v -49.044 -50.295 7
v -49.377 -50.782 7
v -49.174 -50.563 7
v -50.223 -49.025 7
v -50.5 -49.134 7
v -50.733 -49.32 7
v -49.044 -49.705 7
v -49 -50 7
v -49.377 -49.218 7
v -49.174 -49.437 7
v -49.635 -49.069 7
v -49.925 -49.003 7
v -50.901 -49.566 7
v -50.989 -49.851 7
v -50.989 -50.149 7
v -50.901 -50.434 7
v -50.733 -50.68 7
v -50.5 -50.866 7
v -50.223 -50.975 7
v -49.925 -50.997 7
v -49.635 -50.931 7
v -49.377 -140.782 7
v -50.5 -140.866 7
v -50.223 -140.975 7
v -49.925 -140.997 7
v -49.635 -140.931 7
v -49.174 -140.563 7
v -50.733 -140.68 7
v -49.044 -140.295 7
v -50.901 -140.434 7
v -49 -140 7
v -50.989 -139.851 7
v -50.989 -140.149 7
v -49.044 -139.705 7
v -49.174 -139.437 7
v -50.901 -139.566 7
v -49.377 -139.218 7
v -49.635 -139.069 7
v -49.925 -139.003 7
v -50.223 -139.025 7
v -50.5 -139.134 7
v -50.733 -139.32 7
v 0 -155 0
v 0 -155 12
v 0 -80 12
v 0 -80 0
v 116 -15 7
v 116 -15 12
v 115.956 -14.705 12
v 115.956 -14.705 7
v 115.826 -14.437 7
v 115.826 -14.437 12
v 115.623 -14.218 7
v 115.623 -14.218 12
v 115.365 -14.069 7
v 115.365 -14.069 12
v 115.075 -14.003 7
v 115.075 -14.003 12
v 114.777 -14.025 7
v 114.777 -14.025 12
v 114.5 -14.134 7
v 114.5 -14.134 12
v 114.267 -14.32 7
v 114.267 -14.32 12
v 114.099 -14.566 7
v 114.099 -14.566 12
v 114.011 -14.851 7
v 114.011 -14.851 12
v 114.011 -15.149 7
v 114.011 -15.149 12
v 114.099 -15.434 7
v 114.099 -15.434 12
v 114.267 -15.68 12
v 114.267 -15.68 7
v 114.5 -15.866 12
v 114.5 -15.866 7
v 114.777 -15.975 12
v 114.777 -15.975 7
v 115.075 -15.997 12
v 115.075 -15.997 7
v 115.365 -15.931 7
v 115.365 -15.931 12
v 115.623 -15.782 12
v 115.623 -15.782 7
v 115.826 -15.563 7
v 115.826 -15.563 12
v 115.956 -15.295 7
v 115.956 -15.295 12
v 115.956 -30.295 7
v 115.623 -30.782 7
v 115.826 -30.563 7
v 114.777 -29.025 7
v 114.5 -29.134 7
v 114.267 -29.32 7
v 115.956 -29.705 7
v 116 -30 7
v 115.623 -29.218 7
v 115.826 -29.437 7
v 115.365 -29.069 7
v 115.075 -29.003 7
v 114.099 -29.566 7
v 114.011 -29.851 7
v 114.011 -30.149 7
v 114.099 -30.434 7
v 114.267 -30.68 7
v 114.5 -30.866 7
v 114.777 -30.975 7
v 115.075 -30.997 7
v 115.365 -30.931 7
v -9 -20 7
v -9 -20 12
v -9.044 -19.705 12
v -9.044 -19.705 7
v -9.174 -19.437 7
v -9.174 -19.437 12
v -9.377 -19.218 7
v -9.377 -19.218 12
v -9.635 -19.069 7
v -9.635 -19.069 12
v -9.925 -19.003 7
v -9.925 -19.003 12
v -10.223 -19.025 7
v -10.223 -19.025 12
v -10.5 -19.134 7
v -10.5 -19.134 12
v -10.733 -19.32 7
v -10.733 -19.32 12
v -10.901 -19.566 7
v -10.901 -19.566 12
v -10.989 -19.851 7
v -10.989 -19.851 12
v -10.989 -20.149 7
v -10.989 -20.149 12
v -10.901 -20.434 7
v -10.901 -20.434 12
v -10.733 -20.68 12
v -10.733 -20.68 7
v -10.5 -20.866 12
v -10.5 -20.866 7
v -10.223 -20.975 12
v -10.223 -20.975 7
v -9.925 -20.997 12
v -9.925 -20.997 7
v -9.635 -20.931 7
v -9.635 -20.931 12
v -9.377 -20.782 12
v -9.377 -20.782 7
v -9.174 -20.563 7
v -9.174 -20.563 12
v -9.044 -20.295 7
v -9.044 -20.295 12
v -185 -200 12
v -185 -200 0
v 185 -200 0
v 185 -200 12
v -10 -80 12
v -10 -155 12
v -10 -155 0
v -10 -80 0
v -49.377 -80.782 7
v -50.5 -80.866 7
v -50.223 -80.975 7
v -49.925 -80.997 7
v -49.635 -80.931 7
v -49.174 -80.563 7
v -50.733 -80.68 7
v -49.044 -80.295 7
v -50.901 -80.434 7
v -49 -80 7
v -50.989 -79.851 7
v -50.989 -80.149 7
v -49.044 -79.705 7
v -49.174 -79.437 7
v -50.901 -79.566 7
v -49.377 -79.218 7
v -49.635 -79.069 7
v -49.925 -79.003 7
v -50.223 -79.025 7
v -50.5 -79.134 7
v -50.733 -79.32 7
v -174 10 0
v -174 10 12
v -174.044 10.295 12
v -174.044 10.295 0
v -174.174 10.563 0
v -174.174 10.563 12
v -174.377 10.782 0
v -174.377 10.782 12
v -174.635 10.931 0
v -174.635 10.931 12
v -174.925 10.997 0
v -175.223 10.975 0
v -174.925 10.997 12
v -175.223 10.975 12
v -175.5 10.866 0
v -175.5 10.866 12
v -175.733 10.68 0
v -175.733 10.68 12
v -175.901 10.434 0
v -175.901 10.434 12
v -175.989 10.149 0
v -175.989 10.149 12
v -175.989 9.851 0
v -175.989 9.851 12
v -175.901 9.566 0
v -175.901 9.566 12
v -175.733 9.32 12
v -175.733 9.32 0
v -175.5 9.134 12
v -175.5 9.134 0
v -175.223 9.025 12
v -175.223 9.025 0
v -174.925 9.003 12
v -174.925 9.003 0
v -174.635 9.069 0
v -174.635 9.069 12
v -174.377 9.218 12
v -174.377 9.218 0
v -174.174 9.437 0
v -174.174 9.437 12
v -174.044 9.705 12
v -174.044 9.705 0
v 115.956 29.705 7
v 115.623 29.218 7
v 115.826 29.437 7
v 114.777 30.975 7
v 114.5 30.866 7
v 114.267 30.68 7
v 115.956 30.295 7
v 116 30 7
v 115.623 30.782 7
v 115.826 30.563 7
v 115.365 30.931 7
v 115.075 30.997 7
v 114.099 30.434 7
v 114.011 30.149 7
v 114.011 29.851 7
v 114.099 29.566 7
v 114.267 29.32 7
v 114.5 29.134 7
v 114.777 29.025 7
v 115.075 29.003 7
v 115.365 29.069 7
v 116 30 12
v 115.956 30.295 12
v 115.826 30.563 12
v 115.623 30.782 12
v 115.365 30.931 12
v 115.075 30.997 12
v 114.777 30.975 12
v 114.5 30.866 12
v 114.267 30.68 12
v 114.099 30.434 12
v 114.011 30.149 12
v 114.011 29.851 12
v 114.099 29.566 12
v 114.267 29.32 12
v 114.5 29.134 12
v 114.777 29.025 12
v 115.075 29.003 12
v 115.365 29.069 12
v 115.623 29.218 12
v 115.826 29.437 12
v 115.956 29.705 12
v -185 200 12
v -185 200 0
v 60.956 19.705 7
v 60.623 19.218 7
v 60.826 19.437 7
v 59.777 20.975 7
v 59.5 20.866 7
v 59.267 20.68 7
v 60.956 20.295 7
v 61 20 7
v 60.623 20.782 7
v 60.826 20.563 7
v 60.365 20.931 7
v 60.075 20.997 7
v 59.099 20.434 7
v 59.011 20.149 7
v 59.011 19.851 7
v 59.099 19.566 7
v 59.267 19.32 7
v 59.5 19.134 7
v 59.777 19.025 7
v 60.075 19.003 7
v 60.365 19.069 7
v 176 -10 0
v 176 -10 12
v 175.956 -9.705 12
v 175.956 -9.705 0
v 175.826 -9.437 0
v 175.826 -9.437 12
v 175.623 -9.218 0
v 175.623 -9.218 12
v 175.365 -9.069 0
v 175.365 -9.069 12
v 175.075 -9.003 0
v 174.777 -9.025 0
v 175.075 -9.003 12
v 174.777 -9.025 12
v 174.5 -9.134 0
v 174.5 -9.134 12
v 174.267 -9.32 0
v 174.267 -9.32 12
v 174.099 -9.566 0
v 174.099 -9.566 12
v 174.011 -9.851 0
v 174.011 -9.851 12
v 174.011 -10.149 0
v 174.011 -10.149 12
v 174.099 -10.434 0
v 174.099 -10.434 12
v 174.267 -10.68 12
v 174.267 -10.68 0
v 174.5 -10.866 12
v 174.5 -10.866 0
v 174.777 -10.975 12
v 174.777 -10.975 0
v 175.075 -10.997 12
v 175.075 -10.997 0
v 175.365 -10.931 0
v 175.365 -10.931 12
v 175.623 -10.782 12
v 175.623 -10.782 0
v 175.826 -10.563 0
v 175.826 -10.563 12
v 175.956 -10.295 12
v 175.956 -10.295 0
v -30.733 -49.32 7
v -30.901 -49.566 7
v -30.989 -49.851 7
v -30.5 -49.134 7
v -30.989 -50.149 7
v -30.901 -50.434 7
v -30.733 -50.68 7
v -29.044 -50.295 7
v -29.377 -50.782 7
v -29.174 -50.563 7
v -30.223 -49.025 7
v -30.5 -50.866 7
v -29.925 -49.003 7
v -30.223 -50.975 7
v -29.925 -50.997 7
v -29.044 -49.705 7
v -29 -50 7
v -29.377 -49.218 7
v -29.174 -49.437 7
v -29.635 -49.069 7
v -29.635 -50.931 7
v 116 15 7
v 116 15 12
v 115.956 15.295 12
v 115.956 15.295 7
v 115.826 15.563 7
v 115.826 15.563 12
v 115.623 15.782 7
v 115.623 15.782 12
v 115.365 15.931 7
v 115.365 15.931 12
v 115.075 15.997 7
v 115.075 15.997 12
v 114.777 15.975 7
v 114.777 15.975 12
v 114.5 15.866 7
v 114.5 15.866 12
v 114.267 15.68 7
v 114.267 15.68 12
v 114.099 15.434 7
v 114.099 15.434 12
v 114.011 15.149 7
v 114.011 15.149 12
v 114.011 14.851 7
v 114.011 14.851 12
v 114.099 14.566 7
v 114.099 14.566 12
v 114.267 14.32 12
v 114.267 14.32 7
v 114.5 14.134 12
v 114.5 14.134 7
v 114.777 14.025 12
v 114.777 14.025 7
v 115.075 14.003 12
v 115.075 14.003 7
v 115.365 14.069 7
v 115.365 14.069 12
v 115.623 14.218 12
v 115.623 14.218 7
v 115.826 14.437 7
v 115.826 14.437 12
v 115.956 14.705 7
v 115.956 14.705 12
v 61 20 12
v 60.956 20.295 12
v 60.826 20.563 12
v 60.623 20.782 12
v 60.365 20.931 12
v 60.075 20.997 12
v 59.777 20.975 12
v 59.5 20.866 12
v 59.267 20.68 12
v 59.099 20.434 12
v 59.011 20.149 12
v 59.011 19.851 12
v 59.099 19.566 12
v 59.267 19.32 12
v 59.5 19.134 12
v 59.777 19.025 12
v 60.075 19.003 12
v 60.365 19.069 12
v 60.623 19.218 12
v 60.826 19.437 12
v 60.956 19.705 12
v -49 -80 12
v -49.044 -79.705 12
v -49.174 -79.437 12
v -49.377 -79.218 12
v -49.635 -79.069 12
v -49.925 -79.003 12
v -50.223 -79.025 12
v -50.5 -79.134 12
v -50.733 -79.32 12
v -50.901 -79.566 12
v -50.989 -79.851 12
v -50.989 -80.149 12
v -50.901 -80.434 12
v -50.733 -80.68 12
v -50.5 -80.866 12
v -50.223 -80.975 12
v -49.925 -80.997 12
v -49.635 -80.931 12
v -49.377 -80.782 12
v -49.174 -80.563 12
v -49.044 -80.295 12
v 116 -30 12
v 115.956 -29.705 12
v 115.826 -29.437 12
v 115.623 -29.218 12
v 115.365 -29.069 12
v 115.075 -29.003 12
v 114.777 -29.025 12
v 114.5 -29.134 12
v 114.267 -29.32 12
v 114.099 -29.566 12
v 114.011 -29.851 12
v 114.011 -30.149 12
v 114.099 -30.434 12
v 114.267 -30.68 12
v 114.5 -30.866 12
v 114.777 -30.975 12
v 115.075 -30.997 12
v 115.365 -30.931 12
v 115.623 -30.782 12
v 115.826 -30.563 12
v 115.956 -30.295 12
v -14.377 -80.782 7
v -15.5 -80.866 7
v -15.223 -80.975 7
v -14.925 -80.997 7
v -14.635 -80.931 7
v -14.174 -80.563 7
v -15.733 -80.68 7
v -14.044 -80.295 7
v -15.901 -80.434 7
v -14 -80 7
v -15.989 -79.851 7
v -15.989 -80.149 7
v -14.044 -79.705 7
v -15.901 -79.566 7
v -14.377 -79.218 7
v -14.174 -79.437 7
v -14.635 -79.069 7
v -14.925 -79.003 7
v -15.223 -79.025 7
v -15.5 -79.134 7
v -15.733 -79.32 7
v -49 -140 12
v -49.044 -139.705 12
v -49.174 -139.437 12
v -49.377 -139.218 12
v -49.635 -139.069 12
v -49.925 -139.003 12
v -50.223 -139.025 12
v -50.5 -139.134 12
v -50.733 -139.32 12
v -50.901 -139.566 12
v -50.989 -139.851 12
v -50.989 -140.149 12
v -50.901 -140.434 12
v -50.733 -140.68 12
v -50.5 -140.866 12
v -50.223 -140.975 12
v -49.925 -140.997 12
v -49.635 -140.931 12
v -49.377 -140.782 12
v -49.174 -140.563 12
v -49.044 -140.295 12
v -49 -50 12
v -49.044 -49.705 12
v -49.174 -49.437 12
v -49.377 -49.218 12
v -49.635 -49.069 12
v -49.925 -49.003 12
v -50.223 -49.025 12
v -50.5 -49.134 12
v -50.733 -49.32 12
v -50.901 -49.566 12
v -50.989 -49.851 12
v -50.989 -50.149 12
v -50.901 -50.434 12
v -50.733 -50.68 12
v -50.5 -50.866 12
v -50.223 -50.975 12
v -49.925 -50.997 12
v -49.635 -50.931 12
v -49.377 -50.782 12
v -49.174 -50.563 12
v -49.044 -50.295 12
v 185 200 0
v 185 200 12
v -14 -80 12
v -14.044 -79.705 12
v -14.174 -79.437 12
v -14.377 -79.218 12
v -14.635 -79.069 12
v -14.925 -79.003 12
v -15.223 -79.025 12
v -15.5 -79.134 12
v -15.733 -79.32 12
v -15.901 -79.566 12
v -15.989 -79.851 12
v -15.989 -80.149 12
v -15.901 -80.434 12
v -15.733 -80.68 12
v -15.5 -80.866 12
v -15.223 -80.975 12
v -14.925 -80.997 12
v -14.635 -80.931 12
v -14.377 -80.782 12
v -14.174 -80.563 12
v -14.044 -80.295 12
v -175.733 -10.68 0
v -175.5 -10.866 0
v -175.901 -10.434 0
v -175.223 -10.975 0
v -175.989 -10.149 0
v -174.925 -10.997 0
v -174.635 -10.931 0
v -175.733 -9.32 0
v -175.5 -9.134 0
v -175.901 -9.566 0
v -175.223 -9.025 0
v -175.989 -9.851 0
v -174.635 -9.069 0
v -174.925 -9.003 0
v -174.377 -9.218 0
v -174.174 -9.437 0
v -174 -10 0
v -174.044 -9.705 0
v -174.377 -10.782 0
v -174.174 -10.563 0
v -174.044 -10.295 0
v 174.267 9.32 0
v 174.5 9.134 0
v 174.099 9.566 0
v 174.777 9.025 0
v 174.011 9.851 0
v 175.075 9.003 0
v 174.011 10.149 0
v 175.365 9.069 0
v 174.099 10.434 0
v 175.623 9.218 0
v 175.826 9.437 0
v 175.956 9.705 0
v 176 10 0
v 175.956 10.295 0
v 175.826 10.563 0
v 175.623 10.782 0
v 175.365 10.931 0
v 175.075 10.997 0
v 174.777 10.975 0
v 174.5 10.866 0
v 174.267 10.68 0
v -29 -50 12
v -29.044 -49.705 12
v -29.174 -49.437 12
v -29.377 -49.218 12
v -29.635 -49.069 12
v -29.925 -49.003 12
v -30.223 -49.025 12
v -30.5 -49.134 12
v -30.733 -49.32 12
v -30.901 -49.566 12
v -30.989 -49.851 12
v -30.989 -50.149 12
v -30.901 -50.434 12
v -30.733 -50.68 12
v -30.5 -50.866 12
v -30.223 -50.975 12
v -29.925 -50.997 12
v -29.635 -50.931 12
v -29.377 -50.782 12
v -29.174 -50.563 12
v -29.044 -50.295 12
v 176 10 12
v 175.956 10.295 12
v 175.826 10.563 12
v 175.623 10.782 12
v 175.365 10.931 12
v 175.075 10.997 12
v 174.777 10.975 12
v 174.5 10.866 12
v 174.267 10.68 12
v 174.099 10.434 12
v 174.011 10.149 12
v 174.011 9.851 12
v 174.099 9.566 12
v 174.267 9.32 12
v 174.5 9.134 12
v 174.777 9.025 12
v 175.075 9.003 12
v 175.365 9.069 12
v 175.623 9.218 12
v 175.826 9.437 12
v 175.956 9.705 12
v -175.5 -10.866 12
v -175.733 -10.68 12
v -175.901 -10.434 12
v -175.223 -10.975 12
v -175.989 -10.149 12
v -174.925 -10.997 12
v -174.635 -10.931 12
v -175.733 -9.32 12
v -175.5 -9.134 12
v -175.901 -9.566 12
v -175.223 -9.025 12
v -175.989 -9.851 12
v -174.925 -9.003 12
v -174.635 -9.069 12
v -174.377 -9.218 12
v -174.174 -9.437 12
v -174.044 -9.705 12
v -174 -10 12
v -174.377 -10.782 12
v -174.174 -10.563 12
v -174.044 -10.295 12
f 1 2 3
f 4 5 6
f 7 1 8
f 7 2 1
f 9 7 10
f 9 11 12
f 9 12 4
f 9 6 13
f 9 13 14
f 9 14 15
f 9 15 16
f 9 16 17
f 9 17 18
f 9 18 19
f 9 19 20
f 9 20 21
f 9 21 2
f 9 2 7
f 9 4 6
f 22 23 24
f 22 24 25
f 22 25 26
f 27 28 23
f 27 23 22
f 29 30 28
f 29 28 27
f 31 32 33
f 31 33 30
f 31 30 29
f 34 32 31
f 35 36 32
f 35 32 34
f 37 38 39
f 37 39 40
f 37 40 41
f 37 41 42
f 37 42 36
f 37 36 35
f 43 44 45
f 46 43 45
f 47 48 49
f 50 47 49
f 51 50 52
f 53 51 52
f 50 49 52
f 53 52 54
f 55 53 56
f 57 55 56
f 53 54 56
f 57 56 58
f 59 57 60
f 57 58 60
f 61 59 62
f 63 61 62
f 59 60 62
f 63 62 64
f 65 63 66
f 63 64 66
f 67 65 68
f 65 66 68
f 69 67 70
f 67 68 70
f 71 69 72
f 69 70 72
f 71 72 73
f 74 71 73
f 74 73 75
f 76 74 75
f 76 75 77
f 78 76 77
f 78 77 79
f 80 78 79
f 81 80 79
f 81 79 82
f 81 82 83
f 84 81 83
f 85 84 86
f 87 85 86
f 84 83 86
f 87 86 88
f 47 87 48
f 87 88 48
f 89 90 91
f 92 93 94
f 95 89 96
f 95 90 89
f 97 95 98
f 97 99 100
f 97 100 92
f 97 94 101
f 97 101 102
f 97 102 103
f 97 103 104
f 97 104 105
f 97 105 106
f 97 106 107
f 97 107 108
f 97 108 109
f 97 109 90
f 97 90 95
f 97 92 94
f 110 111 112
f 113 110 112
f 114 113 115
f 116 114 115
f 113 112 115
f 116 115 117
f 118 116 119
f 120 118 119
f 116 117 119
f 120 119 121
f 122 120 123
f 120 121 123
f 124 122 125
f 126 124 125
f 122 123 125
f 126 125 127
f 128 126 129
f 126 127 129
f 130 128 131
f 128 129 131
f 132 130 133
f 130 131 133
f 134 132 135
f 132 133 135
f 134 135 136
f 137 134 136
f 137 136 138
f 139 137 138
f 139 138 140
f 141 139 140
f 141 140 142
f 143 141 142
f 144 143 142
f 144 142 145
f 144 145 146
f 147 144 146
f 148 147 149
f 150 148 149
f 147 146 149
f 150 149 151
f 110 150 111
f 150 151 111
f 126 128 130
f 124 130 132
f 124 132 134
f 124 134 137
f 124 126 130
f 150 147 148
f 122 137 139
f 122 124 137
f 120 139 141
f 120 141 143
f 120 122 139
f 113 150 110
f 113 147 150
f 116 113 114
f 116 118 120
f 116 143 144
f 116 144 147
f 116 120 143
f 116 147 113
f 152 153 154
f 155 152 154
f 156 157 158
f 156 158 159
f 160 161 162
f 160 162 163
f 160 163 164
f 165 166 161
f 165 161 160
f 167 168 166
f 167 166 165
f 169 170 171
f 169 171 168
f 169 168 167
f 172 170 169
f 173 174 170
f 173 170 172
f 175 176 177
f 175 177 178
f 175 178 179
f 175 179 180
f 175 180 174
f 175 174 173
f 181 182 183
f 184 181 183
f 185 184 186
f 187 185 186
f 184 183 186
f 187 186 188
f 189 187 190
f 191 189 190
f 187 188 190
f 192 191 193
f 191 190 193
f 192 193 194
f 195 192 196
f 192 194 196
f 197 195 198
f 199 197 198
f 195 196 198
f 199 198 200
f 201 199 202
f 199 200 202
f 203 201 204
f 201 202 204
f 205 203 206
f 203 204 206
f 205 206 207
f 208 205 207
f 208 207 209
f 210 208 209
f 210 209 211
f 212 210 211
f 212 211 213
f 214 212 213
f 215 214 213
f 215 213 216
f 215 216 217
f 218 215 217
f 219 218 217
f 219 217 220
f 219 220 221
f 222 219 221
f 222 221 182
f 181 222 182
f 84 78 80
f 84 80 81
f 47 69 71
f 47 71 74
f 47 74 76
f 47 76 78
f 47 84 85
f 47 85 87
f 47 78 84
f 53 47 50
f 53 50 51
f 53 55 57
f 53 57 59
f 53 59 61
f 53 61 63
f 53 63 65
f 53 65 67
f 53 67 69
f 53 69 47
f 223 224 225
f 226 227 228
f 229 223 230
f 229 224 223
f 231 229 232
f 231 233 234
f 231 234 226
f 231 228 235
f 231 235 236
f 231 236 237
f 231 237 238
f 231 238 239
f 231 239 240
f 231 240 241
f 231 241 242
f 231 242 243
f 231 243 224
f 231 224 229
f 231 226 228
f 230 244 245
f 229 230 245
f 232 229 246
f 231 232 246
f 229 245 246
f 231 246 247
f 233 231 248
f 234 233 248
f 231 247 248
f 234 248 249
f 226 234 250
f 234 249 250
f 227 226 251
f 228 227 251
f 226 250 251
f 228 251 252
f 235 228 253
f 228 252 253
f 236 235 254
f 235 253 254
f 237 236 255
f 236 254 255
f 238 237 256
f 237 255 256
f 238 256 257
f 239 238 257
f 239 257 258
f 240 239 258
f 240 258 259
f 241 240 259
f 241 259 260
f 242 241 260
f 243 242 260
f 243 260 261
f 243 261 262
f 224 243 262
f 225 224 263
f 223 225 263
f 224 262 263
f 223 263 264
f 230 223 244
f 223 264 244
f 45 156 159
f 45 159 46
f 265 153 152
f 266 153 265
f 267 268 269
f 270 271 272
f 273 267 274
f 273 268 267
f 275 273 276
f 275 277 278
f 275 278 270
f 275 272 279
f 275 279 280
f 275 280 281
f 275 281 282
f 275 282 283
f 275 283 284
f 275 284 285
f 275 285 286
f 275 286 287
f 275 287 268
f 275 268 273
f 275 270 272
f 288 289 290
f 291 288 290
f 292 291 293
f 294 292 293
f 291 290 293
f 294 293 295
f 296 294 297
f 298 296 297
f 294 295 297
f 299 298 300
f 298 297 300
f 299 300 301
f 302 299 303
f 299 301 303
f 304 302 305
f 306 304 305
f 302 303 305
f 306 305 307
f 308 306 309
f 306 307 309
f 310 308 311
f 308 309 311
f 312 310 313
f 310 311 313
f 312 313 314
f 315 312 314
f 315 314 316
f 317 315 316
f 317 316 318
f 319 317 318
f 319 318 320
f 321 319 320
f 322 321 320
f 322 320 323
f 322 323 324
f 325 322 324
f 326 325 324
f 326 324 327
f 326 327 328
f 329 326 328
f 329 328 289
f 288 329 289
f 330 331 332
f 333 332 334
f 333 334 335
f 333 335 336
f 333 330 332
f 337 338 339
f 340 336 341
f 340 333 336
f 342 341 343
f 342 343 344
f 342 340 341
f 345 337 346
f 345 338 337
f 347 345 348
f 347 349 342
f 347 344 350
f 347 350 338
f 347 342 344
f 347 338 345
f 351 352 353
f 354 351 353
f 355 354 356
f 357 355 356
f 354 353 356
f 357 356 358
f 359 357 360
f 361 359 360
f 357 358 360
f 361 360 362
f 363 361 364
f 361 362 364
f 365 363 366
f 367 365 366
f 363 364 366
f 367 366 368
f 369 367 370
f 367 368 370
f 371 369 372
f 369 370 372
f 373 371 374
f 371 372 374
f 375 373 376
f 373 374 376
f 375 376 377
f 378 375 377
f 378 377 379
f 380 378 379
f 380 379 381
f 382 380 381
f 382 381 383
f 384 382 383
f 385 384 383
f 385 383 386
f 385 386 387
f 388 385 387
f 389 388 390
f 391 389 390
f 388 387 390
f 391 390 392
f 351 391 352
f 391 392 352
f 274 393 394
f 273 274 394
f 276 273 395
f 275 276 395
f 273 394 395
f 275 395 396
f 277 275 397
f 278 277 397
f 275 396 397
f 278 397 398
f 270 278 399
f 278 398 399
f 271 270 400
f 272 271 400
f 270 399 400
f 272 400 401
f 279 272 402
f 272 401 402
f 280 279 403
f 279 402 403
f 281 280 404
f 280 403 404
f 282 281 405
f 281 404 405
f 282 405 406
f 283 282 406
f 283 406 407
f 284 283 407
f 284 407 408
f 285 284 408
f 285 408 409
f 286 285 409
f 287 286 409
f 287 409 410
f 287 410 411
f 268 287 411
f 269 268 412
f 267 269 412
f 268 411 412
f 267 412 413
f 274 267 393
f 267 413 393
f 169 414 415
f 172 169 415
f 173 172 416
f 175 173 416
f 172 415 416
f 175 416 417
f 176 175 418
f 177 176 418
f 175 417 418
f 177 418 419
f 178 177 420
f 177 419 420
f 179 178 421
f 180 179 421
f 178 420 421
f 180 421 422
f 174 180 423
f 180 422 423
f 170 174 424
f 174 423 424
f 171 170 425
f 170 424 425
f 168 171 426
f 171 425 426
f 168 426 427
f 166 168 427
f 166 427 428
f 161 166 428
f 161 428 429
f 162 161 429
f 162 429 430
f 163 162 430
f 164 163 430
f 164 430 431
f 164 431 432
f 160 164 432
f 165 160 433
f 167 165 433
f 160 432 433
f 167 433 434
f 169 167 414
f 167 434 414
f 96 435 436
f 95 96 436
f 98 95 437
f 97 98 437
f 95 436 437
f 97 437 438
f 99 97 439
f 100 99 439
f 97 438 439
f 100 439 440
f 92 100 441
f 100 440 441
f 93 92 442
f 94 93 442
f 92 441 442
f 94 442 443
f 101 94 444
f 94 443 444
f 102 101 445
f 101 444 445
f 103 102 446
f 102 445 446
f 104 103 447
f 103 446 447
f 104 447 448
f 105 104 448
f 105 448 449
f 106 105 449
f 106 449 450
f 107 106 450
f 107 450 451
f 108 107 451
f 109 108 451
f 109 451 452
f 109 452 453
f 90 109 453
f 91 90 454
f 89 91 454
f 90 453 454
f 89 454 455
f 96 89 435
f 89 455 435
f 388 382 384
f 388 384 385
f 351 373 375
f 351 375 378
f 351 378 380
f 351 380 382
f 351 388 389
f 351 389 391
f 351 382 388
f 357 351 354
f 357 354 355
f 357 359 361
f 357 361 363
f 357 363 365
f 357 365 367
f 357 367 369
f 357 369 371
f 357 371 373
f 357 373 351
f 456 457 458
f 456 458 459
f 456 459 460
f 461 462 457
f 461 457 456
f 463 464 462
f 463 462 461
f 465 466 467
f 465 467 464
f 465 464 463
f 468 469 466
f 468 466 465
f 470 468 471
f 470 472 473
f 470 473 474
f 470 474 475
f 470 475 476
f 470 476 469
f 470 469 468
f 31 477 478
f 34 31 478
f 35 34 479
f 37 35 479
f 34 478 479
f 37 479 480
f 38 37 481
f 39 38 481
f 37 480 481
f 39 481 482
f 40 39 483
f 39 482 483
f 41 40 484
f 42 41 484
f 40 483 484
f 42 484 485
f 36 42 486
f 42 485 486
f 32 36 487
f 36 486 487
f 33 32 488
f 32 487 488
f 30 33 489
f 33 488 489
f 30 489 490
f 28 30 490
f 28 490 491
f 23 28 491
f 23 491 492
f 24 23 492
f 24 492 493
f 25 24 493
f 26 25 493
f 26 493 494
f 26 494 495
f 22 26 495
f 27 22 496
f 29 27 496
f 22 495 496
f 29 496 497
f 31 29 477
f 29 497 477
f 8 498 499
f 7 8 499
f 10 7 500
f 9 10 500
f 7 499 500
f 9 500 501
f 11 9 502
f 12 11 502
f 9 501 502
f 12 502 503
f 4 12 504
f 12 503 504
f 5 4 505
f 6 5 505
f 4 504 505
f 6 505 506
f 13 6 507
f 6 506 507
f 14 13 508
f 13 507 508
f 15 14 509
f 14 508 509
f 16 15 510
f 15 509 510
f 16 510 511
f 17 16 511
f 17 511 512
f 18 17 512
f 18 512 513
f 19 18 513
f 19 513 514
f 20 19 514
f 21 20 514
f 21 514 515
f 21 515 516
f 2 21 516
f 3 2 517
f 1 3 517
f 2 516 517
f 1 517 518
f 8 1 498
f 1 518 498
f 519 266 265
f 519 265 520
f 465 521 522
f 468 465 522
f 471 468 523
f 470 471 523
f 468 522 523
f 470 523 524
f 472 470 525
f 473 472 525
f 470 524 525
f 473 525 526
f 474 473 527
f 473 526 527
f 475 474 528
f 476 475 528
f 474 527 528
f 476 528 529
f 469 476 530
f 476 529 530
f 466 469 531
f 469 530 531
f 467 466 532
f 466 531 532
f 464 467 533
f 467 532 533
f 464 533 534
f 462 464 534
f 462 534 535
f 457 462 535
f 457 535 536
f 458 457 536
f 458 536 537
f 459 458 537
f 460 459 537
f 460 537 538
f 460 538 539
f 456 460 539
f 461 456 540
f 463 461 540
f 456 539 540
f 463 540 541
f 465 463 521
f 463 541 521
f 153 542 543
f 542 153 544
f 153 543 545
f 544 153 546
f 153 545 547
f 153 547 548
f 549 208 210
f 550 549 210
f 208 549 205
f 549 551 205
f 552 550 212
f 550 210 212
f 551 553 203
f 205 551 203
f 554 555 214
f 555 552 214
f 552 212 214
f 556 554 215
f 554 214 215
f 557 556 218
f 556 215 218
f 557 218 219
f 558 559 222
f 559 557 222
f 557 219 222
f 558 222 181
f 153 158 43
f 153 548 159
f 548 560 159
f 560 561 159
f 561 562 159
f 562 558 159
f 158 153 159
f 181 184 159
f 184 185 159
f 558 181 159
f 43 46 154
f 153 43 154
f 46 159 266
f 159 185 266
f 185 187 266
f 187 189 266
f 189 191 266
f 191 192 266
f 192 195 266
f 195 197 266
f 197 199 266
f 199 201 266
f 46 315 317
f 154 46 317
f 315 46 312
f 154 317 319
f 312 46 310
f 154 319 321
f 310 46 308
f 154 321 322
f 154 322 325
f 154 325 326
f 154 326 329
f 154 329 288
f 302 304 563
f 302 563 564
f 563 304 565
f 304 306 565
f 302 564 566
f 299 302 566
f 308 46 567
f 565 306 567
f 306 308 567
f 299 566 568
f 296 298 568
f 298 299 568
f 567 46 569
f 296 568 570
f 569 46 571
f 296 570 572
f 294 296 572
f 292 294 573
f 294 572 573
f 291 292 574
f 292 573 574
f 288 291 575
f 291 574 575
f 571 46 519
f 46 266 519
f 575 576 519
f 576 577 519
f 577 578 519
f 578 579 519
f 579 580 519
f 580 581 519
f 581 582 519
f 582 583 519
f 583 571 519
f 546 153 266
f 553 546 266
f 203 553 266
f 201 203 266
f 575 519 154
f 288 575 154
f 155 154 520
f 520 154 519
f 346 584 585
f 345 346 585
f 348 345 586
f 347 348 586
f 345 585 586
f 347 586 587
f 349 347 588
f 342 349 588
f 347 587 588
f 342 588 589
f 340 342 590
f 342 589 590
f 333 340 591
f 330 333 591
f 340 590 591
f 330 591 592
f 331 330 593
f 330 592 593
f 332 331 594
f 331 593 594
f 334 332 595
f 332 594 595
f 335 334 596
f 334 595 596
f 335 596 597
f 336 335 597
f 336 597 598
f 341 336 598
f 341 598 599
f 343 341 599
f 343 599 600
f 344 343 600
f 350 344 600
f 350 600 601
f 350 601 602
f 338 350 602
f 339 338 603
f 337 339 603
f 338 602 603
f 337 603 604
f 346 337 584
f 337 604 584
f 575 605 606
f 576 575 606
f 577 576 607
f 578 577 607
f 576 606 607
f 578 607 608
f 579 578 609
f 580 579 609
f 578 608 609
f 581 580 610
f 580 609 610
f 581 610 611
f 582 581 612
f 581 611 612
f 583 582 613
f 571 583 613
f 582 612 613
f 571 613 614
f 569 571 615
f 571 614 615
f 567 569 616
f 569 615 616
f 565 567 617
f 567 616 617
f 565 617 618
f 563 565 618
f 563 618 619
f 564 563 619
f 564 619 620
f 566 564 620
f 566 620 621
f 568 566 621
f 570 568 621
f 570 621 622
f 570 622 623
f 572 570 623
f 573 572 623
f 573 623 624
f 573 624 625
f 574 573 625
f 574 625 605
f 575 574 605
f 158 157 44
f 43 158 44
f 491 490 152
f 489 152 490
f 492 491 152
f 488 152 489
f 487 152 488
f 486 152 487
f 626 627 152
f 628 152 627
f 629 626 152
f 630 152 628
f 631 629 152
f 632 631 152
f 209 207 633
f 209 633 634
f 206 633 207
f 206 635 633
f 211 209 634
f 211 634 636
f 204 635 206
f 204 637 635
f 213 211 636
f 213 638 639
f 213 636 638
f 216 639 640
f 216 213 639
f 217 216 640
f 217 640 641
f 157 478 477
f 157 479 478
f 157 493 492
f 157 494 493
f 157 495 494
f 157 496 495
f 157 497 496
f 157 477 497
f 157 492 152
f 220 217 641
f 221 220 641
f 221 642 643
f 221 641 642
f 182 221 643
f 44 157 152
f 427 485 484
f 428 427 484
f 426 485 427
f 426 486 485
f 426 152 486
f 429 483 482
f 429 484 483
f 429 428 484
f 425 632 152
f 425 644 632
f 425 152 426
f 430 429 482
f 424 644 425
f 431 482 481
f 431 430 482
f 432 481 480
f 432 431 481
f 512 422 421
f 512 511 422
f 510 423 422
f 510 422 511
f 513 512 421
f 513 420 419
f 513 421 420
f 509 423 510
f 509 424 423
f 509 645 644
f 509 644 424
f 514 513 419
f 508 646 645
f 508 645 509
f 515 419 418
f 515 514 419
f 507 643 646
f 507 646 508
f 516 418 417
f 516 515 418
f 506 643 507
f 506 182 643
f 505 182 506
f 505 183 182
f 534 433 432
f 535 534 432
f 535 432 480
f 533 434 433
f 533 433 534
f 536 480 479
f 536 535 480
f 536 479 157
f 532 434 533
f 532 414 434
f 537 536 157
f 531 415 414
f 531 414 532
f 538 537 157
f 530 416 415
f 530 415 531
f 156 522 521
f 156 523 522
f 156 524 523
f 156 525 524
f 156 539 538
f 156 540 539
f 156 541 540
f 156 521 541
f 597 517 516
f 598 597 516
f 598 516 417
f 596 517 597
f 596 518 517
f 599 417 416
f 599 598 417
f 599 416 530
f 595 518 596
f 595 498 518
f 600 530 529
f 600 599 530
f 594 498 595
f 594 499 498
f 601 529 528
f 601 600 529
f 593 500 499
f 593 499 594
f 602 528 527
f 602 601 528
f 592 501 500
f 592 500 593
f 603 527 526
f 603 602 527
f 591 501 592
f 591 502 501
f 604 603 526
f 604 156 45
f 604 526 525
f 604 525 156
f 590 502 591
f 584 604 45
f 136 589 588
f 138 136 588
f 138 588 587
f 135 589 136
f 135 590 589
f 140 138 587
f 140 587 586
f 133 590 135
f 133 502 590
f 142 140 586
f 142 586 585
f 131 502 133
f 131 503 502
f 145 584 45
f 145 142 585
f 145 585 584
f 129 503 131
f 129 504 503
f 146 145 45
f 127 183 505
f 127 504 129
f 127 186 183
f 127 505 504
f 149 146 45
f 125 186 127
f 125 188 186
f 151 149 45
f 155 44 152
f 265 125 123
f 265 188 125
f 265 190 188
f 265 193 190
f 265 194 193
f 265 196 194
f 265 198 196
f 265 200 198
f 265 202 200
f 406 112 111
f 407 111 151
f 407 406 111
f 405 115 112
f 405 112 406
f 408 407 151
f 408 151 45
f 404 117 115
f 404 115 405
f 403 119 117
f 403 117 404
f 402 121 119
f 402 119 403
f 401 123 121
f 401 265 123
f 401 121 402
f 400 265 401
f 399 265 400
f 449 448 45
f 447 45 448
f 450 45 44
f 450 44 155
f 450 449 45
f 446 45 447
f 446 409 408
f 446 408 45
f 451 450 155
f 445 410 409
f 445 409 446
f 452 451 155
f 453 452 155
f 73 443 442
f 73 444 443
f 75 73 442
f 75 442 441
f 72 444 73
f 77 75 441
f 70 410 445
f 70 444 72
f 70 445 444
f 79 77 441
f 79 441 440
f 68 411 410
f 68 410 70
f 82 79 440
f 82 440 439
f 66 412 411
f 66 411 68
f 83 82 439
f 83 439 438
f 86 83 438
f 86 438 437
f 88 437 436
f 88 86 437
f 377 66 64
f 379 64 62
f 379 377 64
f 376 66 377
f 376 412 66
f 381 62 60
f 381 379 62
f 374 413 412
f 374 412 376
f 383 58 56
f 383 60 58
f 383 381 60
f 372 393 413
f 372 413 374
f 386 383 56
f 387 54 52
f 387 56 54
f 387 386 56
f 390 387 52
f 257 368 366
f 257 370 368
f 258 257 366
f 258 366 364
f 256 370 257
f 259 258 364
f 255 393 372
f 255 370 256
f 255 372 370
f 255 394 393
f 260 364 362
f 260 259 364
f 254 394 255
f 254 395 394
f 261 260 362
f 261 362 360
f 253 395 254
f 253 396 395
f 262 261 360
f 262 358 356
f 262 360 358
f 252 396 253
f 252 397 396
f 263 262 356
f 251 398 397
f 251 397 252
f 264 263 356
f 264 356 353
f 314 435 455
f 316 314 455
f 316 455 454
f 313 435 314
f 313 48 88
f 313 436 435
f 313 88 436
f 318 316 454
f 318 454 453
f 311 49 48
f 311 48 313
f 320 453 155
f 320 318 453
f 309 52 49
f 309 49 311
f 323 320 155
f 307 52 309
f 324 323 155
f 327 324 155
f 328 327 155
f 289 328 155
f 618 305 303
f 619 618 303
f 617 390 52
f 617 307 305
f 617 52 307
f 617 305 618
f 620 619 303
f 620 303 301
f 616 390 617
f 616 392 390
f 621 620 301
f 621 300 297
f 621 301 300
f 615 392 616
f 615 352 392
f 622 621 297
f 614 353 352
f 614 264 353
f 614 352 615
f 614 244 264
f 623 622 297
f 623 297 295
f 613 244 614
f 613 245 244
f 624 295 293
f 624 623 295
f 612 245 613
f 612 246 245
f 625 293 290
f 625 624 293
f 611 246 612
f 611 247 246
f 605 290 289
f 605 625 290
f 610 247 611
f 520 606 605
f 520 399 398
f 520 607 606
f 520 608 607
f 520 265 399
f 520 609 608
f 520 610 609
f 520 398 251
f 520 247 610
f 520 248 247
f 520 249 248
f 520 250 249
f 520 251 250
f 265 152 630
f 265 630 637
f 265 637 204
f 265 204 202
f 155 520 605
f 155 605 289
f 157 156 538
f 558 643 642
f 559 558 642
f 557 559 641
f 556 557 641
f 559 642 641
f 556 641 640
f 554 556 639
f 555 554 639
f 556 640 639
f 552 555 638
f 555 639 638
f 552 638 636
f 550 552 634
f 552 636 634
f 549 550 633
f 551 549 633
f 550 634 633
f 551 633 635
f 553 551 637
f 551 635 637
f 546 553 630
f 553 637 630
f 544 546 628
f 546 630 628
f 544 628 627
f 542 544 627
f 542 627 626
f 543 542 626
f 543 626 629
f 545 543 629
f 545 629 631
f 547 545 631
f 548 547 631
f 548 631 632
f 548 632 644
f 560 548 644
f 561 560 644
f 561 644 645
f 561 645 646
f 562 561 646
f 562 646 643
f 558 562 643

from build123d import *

# Parameters (mm, degrees)
F0_W      = 370
F0_H      = 400
F1_DEPTH  = 12
F2_W      = 10
F2_H      = 75
F3_DEPTH  = 25
F4_R      = 1
F5_DEPTH  = 5
F6_R      = 1
F7_DEPTH  = 25
F8_R      = 1
F9_DEPTH  = 25
F10_R     = 1
F11_DEPTH = 5
F12_R     = 1
F13_DEPTH = 5
F14_R     = 1
F15_DEPTH = 5


with BuildPart() as f1:
    # F0 (on Top) → F1 (new body)
    with BuildSketch(Plane.XY):
        Rectangle(F0_W, F0_H)
    extrude(amount=F1_DEPTH)

    # F2 (on face) → F3 (cut)
    with BuildSketch(Plane.XY.offset(12)):
        with Locations((-5, -117.5)):
            Rectangle(F2_W, F2_H)
    extrude(amount=-F3_DEPTH, mode=Mode.SUBTRACT)

    # F4 (on face) → F5 (cut)
    with BuildSketch(Plane.XY.offset(12)):
        with Locations((-50, -80)):
            Circle(F4_R)
        with Locations((-15, -80)):
            Circle(F4_R)
        with Locations((-50, -140)):
            Circle(F4_R)
        with Locations((-30, -50)):
            Circle(F4_R)
        with Locations((-50, -50)):
            Circle(F4_R)
    extrude(amount=-F5_DEPTH, mode=Mode.SUBTRACT)

    # F6 (on face) → F7 (cut)
    with BuildSketch(Plane.XY.offset(12)):
        with Locations((-175, -10)):
            Circle(F6_R)
        with Locations((-175, 10)):
            Circle(F6_R)
    extrude(amount=-F7_DEPTH, mode=Mode.SUBTRACT)

    # F8 (on face) → F9 (cut)
    with BuildSketch(Plane.XY.offset(12)):
        with Locations((175, 10)):
            Circle(F8_R)
        with Locations((175, -10)):
            Circle(F8_R)
    extrude(amount=-F9_DEPTH, mode=Mode.SUBTRACT)

    # F10 (on face) → F11 (cut)
    with BuildSketch(Plane.XY.offset(12)):
        with Locations((60, 20)):
            Circle(F10_R)
        with Locations((-10, -20)):
            Circle(F10_R)
    extrude(amount=-F11_DEPTH, mode=Mode.SUBTRACT)

    # F12 (on face) → F13 (cut)
    with BuildSketch(Plane.XY.offset(12)):
        with Locations((115, -15)):
            Circle(F12_R)
        with Locations((115, -30)):
            Circle(F12_R)
    extrude(amount=-F13_DEPTH, mode=Mode.SUBTRACT)

    # F14 (on face) → F15 (cut)
    with BuildSketch(Plane.XY.offset(12)):
        with Locations((115, 30)):
            Circle(F14_R)
        with Locations((115, 15)):
            Circle(F14_R)
    extrude(amount=-F15_DEPTH, mode=Mode.SUBTRACT)


solid = f1.part
